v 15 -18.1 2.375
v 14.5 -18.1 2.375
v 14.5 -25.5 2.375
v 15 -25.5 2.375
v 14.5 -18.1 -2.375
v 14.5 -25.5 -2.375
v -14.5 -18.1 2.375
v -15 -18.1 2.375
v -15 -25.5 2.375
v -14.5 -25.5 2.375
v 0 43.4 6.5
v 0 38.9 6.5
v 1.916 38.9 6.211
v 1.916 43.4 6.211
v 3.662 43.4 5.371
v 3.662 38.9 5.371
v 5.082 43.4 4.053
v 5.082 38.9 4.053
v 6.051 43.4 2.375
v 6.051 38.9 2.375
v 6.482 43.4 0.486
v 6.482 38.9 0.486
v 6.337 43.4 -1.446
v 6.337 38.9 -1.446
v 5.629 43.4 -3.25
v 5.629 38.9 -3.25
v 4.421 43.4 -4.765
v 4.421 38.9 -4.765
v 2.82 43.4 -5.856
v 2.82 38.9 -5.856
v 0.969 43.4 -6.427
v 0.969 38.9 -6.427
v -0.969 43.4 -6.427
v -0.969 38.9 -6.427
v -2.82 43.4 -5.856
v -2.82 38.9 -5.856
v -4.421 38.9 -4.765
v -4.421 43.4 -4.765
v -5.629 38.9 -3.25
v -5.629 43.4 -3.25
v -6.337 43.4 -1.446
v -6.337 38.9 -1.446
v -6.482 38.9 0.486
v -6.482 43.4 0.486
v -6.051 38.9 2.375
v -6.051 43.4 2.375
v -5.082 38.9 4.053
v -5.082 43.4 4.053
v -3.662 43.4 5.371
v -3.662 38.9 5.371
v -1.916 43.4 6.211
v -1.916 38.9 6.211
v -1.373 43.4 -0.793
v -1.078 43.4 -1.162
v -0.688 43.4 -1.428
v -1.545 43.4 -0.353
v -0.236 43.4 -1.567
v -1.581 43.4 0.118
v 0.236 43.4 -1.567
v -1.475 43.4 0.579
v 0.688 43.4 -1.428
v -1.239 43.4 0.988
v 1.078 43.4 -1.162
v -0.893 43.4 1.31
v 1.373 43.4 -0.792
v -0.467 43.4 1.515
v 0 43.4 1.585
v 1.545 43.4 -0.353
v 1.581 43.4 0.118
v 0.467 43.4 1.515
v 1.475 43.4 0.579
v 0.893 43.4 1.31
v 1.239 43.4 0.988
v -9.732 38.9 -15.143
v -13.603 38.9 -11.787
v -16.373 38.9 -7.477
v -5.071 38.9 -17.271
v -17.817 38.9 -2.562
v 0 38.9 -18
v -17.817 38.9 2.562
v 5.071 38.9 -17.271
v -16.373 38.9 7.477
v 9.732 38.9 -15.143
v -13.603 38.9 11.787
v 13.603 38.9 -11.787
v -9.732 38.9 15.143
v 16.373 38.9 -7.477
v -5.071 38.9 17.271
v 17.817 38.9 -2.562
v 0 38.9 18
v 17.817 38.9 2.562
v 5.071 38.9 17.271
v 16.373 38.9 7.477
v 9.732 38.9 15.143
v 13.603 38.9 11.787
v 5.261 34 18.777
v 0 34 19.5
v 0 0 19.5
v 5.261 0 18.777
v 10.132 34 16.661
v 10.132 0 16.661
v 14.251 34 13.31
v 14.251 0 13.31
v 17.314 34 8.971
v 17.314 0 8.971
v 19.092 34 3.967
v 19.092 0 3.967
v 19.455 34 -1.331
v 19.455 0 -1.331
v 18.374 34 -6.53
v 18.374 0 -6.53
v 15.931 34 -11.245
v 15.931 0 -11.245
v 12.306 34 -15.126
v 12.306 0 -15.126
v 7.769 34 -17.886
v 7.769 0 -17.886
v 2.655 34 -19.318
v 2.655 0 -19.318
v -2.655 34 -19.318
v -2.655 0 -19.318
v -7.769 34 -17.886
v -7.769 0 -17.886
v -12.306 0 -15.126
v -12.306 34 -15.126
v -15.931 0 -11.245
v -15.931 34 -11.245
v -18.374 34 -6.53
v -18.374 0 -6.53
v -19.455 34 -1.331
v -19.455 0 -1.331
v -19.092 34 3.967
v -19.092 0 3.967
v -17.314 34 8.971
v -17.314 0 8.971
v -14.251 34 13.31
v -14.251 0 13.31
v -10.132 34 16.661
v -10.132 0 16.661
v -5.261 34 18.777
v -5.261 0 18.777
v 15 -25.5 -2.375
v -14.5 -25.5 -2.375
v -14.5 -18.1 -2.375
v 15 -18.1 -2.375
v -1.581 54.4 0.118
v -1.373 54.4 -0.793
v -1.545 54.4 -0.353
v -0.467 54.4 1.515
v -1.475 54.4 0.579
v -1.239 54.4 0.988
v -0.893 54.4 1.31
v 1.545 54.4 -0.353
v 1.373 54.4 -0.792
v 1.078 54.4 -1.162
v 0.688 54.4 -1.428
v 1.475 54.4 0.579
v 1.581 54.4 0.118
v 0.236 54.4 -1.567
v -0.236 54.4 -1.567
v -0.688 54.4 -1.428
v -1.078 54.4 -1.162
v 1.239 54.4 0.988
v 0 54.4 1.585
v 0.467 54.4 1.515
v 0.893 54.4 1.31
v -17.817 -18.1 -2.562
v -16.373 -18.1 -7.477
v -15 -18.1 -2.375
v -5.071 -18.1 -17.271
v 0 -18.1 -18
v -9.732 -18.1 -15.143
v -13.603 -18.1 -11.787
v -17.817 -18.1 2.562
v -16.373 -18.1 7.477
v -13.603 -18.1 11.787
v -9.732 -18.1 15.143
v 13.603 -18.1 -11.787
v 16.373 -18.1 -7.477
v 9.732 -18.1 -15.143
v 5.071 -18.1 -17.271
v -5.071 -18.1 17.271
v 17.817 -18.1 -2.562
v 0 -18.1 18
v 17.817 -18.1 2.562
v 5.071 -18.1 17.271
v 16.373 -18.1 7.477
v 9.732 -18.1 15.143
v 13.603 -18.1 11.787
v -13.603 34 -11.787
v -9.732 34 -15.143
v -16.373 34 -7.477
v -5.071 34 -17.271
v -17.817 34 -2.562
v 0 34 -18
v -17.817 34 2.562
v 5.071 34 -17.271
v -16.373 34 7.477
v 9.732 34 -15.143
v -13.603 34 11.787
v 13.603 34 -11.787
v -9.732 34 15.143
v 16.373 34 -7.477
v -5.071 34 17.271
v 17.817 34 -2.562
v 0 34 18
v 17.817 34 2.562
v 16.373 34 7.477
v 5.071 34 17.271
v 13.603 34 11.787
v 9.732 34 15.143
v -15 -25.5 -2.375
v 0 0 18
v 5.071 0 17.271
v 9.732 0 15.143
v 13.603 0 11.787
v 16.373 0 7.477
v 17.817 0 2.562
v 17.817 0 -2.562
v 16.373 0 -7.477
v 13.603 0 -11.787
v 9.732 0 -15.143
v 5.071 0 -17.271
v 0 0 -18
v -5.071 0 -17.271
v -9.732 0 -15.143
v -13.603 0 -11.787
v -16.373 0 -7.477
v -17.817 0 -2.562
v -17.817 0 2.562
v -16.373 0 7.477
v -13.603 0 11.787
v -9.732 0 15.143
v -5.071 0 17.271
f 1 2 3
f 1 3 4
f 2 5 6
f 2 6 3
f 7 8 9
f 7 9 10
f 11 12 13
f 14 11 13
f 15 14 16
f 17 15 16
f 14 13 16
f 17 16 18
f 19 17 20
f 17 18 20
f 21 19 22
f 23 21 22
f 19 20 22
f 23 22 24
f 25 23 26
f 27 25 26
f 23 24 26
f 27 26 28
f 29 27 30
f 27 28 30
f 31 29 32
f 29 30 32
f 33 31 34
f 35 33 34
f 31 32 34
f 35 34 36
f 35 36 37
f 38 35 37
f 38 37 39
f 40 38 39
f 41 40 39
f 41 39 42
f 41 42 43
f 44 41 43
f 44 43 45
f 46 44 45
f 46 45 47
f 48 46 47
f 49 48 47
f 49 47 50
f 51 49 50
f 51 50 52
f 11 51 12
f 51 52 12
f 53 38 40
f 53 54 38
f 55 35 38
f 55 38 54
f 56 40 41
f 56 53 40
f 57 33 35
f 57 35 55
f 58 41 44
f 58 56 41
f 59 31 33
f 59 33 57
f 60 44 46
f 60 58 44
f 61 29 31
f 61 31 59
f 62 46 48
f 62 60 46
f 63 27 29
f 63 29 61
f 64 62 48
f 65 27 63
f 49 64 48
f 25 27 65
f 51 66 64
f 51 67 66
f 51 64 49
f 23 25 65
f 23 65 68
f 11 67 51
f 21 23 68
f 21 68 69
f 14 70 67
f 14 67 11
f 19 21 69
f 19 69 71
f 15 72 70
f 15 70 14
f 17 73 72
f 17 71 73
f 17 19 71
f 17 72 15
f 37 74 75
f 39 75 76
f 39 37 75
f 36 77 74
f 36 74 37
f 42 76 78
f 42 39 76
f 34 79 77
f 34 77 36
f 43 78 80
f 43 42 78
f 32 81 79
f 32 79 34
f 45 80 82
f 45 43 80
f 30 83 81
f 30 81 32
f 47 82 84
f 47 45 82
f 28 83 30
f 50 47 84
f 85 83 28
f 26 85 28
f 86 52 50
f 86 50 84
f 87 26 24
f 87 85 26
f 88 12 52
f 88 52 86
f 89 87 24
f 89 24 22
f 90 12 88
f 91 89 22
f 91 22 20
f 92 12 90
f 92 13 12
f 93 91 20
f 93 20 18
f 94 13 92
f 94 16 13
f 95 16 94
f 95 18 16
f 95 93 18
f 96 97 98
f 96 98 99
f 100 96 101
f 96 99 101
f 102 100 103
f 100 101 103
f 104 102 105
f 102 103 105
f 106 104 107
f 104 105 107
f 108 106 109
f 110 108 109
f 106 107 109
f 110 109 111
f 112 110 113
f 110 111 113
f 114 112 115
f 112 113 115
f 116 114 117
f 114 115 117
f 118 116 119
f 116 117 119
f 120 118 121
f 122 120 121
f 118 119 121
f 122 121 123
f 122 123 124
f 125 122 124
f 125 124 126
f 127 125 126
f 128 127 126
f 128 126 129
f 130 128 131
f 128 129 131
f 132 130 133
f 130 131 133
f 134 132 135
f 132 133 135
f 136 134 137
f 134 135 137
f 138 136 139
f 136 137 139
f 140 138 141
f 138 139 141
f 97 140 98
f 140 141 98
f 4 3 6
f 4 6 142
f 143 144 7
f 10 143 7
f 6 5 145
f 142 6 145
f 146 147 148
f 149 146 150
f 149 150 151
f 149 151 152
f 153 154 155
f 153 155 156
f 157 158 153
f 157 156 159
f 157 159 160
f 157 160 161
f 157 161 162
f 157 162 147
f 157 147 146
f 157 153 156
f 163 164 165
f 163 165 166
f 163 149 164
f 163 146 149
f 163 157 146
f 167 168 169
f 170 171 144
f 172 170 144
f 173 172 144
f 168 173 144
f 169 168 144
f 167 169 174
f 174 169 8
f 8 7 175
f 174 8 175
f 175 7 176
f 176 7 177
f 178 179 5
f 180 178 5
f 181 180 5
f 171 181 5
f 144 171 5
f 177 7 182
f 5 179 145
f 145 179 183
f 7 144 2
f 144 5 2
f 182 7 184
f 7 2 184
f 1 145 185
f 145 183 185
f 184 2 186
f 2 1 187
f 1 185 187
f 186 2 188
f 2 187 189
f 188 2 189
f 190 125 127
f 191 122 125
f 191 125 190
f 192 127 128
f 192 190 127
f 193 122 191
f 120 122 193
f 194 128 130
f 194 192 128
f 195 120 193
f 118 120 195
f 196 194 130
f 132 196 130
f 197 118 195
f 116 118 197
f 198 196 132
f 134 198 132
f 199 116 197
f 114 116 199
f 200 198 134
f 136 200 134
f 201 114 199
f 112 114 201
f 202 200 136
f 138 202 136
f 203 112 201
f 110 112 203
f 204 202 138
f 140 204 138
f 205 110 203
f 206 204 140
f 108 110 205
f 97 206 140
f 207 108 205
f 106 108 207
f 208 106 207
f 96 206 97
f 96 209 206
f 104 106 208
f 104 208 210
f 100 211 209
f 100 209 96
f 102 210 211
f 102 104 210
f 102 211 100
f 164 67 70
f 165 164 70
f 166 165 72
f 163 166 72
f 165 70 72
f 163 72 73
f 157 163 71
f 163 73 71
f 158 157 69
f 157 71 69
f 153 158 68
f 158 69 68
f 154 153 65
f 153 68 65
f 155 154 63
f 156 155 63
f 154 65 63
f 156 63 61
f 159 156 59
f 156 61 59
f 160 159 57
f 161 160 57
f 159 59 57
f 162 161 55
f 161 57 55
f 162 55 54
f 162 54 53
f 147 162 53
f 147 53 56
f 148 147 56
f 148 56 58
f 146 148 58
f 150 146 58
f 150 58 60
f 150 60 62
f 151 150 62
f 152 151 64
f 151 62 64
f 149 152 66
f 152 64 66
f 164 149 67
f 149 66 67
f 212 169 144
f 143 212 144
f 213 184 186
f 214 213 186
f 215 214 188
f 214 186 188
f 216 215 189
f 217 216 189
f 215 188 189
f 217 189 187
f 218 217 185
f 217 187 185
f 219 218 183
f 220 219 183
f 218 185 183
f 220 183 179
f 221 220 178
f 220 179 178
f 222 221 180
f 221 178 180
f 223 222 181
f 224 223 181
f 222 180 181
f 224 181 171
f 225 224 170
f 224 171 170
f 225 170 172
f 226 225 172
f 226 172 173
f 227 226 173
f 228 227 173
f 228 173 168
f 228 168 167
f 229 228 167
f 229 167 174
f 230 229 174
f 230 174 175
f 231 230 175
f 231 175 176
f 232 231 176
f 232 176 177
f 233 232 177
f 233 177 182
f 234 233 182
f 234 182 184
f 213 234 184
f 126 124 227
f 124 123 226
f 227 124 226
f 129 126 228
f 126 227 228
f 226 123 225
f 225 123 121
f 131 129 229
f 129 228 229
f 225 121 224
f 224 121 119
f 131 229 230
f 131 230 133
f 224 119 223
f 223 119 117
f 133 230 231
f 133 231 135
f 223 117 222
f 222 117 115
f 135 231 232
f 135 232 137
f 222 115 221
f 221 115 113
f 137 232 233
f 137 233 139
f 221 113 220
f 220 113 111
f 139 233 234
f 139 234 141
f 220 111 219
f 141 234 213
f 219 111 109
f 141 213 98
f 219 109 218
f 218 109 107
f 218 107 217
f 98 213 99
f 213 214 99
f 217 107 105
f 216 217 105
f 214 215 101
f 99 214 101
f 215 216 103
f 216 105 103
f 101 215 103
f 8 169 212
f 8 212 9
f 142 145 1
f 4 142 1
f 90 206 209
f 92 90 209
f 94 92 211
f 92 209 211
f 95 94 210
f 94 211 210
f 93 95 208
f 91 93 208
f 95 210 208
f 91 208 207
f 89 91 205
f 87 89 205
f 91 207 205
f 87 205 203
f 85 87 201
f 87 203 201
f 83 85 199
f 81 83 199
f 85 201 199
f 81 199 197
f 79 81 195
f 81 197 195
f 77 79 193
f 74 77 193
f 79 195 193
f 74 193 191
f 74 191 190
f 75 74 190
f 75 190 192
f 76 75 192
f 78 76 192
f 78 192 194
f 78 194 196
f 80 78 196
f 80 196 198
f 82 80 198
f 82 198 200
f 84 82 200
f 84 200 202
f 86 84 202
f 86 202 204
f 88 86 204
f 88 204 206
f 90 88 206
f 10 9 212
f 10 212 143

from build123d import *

# Parameters (mm, degrees)
SKETCH1_R                = 19.5
SKETCH1_R_2              = 18
BOSS_EXTRUDE1_DEPTH      = 34
BOSS_EXTRUDE2_DEPTH      = 4.9
BOSS_EXTRUDE2_DEPTH_BACK = 52.1
SKETCH2_R                = 18
SKETCH3_R                = 6.5
BOSS_EXTRUDE3_DEPTH      = 4.5
SKETCH4_R                = 1.585
BOSS_EXTRUDE4_DEPTH      = 11
SKETCH5_W                = 0.5
SKETCH5_H                = 4.75
BOSS_EXTRUDE5_DEPTH      = 7.4


with BuildPart() as part:
    # Sketch1 → Boss-Extrude1 (new body)
    with BuildSketch(Plane(origin=(0, 0, 0), x_dir=(1, 0, 0), z_dir=(0, 1, 0))):
        with Locations(Location((0, 0, 0), (0, 0, 270))):
            Circle(SKETCH1_R)
        with Locations(Location((0, 0, 0), (0, 0, 270))):
            Circle(SKETCH1_R_2, mode=Mode.SUBTRACT)
    extrude(amount=BOSS_EXTRUDE1_DEPTH)

    # Sketch2 → Boss-Extrude2 (add, two sides: drawn at the far end of the back side and taken through both)
    with BuildSketch(Plane(origin=(0, 34, 0), x_dir=(1, 0, 0), z_dir=(0, 1, 0)).offset(-BOSS_EXTRUDE2_DEPTH_BACK)):
        with Locations(Location((0, 0, 0), (0, 0, 270))):
            Circle(SKETCH2_R)
    extrude(amount=BOSS_EXTRUDE2_DEPTH + BOSS_EXTRUDE2_DEPTH_BACK)

    # Sketch3 → Boss-Extrude3 (add)
    with BuildSketch(Plane(origin=(0, 38.9, 0), x_dir=(1, 0, 0), z_dir=(0, 1, 0))):
        with Locations(Location((0, 0, 0), (0, 0, 270))):
            Circle(SKETCH3_R)
    extrude(amount=BOSS_EXTRUDE3_DEPTH)

    # Sketch4 → Boss-Extrude4 (add)
    with BuildSketch(Plane(origin=(0, 43.4, 0), x_dir=(1, 0, 0), z_dir=(0, 1, 0))):
        with Locations(Location((0, 0, 0), (0, 0, 270))):
            Circle(SKETCH4_R)
    extrude(amount=BOSS_EXTRUDE4_DEPTH)

    # Sketch5 → Boss-Extrude5 (add)
    with BuildSketch(Plane.XZ.offset(18.1)):
        with Locations((14.75, 0)):
            Rectangle(SKETCH5_W, SKETCH5_H)
        with Locations((-14.75, 0)):
            Rectangle(SKETCH5_W, SKETCH5_H)
    extrude(amount=BOSS_EXTRUDE5_DEPTH)


solid = part.part
